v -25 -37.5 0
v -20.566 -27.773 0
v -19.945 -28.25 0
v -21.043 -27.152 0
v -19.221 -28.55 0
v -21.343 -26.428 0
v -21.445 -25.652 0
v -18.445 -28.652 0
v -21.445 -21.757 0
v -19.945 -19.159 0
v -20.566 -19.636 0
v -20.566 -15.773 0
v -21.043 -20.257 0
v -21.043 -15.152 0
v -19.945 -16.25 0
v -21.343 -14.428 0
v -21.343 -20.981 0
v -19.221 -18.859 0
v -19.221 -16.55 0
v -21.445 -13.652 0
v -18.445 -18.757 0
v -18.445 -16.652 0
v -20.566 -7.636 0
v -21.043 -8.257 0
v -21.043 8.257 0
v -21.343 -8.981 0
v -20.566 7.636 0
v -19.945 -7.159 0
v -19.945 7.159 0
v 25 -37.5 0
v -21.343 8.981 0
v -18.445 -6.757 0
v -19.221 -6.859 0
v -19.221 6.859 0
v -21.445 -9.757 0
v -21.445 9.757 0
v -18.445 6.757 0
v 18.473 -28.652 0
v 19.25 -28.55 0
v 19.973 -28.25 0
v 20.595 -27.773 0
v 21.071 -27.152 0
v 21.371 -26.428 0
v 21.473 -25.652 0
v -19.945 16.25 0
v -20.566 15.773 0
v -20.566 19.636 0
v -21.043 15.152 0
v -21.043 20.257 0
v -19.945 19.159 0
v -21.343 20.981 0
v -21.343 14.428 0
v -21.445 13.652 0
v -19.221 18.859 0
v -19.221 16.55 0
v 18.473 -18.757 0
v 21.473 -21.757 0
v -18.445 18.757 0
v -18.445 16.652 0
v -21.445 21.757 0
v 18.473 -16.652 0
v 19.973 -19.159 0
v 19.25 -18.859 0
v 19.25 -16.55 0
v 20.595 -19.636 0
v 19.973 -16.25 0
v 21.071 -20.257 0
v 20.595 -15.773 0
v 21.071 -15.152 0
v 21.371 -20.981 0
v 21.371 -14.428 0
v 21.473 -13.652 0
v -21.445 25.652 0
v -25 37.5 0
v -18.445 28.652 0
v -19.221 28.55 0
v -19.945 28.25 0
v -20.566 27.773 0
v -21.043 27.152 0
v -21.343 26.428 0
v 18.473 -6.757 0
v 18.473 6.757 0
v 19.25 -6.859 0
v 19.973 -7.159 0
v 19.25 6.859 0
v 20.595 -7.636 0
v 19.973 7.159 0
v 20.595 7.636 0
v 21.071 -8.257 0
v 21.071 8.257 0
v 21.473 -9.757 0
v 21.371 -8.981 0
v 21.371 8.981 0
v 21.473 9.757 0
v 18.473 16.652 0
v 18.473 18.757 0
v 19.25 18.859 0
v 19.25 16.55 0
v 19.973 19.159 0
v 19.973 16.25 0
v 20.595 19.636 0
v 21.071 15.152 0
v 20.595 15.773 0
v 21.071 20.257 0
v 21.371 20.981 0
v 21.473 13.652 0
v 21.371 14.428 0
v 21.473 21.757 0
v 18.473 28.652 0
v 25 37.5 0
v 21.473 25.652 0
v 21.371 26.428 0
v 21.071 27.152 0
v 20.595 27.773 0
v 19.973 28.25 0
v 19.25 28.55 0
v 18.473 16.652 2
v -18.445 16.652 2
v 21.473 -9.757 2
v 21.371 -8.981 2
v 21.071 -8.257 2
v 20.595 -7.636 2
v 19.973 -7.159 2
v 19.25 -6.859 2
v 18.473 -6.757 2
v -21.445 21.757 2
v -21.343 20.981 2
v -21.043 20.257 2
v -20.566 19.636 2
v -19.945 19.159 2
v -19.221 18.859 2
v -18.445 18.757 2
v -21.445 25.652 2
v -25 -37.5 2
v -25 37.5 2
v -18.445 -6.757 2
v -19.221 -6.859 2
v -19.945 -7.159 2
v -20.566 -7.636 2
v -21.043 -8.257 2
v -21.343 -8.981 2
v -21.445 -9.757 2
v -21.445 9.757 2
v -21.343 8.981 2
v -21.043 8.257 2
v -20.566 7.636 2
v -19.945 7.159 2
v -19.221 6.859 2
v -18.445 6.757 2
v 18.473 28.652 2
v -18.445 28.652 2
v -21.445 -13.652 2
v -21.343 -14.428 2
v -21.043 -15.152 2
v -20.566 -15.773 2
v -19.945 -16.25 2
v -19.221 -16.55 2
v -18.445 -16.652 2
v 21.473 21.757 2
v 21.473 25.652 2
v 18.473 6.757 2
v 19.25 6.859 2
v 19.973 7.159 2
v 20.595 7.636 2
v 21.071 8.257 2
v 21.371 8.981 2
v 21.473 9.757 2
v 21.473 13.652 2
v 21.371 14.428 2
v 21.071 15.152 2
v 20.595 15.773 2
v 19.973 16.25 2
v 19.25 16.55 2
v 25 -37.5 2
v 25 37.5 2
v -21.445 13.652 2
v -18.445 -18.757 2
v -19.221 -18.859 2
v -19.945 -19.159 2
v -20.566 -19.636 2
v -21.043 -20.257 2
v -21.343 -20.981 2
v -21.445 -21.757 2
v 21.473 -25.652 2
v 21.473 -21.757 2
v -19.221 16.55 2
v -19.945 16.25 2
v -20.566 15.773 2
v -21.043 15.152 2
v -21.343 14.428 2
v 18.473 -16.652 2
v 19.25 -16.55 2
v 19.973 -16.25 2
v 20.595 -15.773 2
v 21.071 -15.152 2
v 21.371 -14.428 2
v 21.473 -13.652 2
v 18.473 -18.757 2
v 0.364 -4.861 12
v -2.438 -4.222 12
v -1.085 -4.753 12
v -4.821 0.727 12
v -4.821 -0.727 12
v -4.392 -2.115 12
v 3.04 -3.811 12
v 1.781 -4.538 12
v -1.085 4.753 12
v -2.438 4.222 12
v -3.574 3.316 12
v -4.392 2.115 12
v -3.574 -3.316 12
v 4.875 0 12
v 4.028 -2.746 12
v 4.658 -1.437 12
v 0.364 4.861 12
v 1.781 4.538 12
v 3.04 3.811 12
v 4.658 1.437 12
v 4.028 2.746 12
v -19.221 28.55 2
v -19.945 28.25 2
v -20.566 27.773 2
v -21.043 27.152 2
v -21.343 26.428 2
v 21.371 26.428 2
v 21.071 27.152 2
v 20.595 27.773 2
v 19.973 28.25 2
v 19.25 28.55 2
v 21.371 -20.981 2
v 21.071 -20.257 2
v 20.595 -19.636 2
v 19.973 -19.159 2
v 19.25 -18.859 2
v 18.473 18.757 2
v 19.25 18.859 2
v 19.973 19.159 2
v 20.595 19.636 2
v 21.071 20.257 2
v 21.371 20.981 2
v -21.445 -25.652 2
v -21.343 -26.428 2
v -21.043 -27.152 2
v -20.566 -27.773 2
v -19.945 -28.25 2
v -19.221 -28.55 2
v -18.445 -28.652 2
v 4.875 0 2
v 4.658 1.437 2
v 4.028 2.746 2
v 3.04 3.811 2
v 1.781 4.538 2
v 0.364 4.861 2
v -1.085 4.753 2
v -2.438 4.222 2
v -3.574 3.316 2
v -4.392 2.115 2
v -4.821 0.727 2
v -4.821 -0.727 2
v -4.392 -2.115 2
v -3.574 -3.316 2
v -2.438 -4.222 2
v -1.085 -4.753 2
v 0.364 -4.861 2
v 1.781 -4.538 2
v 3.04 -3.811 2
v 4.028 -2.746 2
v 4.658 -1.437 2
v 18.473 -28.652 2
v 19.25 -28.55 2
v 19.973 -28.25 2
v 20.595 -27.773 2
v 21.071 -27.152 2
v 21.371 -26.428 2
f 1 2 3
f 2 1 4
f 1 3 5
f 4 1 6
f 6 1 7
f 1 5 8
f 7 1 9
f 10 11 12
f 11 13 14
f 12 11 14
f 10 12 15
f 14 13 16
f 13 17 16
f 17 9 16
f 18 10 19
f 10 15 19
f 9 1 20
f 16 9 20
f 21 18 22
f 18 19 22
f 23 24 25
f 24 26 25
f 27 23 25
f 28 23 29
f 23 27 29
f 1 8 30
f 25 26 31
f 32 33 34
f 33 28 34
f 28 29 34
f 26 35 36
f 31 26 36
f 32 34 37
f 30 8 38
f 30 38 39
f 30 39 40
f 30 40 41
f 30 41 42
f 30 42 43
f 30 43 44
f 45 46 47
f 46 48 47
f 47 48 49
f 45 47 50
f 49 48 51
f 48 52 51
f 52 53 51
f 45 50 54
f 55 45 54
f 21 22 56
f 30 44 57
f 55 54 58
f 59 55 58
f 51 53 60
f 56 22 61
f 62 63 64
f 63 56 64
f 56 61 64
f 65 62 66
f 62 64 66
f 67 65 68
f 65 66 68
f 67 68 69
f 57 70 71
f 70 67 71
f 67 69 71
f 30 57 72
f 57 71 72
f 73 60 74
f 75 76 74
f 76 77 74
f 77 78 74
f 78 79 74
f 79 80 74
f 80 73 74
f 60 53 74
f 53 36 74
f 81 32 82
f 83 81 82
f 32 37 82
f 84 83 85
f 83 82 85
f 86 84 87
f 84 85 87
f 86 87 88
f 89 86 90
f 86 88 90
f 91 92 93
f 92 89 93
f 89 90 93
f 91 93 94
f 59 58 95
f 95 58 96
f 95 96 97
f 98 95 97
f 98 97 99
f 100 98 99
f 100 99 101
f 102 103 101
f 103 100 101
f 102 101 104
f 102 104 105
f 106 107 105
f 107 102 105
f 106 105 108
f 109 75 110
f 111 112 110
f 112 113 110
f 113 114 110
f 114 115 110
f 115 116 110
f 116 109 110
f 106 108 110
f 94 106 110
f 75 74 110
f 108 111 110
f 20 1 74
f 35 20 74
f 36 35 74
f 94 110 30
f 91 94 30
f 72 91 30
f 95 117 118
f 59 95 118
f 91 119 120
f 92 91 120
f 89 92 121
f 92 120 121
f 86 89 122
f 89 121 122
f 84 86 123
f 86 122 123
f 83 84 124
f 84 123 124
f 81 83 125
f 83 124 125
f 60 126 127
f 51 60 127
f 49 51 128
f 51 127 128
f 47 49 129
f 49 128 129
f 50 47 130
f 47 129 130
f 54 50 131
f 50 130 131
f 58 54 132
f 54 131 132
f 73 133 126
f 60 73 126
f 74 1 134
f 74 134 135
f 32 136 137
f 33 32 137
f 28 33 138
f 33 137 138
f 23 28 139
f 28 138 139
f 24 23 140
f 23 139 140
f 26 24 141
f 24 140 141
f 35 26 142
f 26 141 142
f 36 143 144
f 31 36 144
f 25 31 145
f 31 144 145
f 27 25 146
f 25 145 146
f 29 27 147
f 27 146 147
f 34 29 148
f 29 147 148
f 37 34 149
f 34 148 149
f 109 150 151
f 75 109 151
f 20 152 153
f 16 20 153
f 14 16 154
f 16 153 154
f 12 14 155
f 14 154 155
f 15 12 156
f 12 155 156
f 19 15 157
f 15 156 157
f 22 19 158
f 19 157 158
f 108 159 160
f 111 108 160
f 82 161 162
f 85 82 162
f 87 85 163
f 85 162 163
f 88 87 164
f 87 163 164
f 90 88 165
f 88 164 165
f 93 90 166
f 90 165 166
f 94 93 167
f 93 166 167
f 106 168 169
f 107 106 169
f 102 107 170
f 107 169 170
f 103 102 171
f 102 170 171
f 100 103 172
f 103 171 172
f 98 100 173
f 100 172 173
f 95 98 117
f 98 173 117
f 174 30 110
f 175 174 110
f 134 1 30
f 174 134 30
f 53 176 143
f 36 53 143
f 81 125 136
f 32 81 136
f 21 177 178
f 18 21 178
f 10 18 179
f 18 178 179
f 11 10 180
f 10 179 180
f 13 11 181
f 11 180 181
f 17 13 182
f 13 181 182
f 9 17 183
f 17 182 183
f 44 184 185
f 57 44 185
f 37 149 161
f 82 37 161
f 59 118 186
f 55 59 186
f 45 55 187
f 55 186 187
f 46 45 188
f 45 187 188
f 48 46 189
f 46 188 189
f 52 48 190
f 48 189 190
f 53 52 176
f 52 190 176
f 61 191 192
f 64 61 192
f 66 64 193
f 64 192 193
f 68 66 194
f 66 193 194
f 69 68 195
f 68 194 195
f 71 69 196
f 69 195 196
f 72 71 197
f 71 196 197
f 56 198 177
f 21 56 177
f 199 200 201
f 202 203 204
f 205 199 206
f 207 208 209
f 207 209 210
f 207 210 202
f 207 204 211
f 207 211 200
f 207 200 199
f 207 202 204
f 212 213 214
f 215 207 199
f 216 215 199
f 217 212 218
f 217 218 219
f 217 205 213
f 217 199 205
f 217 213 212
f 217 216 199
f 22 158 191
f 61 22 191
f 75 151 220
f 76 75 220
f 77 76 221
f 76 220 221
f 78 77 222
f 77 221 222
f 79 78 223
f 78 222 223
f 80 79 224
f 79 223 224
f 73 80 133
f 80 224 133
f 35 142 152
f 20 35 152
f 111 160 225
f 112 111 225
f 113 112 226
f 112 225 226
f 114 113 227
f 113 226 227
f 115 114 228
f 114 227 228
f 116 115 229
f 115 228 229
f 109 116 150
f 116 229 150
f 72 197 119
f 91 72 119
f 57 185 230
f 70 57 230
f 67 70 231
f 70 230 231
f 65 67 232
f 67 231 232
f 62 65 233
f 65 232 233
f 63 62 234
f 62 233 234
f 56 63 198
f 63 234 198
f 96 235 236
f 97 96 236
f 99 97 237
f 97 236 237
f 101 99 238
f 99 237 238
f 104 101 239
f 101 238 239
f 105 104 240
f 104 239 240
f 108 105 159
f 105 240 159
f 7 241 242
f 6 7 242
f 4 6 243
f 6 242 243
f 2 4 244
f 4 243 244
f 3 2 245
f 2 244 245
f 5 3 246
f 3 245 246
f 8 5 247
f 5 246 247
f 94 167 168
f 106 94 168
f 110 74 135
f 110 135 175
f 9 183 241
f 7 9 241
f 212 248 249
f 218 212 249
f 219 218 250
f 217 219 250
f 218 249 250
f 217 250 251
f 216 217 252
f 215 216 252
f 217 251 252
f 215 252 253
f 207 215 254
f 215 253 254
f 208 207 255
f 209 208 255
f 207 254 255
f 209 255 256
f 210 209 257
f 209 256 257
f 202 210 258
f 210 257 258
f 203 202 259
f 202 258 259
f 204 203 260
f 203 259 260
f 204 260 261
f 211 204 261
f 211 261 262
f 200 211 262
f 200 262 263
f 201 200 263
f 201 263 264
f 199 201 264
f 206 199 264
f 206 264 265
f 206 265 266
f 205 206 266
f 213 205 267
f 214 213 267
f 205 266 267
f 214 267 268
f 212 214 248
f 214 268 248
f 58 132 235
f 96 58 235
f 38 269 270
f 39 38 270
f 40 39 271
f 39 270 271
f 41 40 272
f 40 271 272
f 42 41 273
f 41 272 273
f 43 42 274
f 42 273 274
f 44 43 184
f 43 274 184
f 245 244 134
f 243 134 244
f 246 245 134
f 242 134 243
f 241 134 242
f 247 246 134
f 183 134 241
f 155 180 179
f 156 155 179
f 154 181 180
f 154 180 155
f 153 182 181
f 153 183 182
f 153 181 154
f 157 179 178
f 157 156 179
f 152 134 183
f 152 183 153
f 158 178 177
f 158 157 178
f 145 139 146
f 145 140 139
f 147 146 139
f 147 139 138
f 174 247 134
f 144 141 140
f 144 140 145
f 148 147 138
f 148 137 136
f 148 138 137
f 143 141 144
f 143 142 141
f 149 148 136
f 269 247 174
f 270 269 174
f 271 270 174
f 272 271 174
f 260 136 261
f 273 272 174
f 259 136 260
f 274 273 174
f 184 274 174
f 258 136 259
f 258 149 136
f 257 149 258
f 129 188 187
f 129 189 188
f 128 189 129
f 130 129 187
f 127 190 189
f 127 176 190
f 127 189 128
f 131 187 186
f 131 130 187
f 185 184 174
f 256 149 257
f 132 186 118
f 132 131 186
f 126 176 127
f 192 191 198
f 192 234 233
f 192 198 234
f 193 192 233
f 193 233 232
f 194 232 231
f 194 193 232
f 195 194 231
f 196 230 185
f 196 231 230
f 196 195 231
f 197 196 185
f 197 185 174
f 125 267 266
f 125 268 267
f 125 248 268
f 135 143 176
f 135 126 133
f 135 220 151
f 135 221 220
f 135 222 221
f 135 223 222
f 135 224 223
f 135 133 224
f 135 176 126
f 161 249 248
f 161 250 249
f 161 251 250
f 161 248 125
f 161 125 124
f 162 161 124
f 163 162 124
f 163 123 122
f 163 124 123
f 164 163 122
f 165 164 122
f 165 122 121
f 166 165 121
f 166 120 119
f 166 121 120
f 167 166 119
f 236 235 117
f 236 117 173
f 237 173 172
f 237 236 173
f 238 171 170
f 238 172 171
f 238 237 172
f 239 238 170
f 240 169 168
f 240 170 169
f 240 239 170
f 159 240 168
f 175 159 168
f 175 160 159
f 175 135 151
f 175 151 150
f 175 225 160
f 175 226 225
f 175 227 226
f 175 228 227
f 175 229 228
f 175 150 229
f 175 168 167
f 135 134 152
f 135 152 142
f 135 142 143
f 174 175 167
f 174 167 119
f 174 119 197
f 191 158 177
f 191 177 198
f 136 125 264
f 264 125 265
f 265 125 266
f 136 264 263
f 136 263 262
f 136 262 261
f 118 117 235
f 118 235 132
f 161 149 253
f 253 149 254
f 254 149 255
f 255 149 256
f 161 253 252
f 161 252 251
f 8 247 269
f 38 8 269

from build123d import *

# Parameters (mm, degrees)
F0_W     = 50
F0_H     = 75
F1_DEPTH = 2
F2_R     = 4.875
F3_DEPTH = 10
F5_DEPTH = 25


with BuildPart() as f1:
    # F0 (on Top) → F1 (new body)
    with BuildSketch(Plane.XY):
        Rectangle(F0_W, F0_H)
    extrude(amount=F1_DEPTH)

    # F2 (on face) → F3 (join)
    with BuildSketch(Plane.XY.offset(2)):
        Circle(F2_R)
    extrude(amount=F3_DEPTH)

    # F4 (on face) → F5 (cut)
    with BuildSketch(Plane.XY.offset(2)):
        with BuildLine():
            ThreePointArc((18.473266, -16.651813), (20.594587, -15.773133), (21.473266, -13.651813))
            Line((21.473266, -13.651813), (21.473266, -9.756987))
            ThreePointArc((21.473266, -9.756987), (20.594587, -7.635667), (18.473266, -6.756987))
            Line((18.473266, -6.756987), (-18.444779, -6.756987))
            ThreePointArc((-18.444779, -6.756987), (-20.566099, -7.635667), (-21.444779, -9.756987))
            Line((-21.444779, -9.756987), (-21.444779, -13.651813))
            ThreePointArc((-21.444779, -13.651813), (-20.566099, -15.773133), (-18.444779, -16.651813))
            Line((-18.444779, -16.651813), (18.473266, -16.651813))
        make_face()
        with BuildLine():
            Line((18.473266, 16.651813), (-18.444779, 16.651813))
            ThreePointArc((-18.444779, 16.651813), (-20.566099, 15.773133), (-21.444779, 13.651813))
            Line((-21.444779, 13.651813), (-21.444779, 9.756987))
            ThreePointArc((-21.444779, 9.756987), (-20.566099, 7.635667), (-18.444779, 6.756987))
            Line((-18.444779, 6.756987), (18.473266, 6.756987))
            ThreePointArc((18.473266, 6.756987), (20.594587, 7.635667), (21.473266, 9.756987))
            Line((21.473266, 9.756987), (21.473266, 13.651813))
            ThreePointArc((21.473266, 13.651813), (20.594587, 15.773133), (18.473266, 16.651813))
        make_face()
        with BuildLine():
            Line((18.473266, -18.756987), (-18.444779, -18.756987))
            ThreePointArc((-18.444779, -18.756987), (-20.566099, -19.635667), (-21.444779, -21.756987))
            Line((-21.444779, -21.756987), (-21.444779, -25.651813))
            ThreePointArc((-21.444779, -25.651813), (-20.566099, -27.773133), (-18.444779, -28.651813))
            Line((-18.444779, -28.651813), (18.473266, -28.651813))
            ThreePointArc((18.473266, -28.651813), (20.594587, -27.773133), (21.473266, -25.651813))
            Line((21.473266, -25.651813), (21.473266, -21.756987))
            ThreePointArc((21.473266, -21.756987), (20.594587, -19.635667), (18.473266, -18.756987))
        make_face()
        with BuildLine():
            Line((21.473266, 21.756987), (21.473266, 25.651813))
            ThreePointArc((21.473266, 25.651813), (20.594587, 27.773133), (18.473266, 28.651813))
            Line((18.473266, 28.651813), (-18.444779, 28.651813))
            ThreePointArc((-18.444779, 28.651813), (-20.566099, 27.773133), (-21.444779, 25.651813))
            Line((-21.444779, 25.651813), (-21.444779, 21.756987))
            ThreePointArc((-21.444779, 21.756987), (-20.566099, 19.635667), (-18.444779, 18.756987))
            Line((-18.444779, 18.756987), (18.473266, 18.756987))
            ThreePointArc((18.473266, 18.756987), (20.594587, 19.635667), (21.473266, 21.756987))
        make_face()
    extrude(amount=-F5_DEPTH, mode=Mode.SUBTRACT)


solid = f1.part
